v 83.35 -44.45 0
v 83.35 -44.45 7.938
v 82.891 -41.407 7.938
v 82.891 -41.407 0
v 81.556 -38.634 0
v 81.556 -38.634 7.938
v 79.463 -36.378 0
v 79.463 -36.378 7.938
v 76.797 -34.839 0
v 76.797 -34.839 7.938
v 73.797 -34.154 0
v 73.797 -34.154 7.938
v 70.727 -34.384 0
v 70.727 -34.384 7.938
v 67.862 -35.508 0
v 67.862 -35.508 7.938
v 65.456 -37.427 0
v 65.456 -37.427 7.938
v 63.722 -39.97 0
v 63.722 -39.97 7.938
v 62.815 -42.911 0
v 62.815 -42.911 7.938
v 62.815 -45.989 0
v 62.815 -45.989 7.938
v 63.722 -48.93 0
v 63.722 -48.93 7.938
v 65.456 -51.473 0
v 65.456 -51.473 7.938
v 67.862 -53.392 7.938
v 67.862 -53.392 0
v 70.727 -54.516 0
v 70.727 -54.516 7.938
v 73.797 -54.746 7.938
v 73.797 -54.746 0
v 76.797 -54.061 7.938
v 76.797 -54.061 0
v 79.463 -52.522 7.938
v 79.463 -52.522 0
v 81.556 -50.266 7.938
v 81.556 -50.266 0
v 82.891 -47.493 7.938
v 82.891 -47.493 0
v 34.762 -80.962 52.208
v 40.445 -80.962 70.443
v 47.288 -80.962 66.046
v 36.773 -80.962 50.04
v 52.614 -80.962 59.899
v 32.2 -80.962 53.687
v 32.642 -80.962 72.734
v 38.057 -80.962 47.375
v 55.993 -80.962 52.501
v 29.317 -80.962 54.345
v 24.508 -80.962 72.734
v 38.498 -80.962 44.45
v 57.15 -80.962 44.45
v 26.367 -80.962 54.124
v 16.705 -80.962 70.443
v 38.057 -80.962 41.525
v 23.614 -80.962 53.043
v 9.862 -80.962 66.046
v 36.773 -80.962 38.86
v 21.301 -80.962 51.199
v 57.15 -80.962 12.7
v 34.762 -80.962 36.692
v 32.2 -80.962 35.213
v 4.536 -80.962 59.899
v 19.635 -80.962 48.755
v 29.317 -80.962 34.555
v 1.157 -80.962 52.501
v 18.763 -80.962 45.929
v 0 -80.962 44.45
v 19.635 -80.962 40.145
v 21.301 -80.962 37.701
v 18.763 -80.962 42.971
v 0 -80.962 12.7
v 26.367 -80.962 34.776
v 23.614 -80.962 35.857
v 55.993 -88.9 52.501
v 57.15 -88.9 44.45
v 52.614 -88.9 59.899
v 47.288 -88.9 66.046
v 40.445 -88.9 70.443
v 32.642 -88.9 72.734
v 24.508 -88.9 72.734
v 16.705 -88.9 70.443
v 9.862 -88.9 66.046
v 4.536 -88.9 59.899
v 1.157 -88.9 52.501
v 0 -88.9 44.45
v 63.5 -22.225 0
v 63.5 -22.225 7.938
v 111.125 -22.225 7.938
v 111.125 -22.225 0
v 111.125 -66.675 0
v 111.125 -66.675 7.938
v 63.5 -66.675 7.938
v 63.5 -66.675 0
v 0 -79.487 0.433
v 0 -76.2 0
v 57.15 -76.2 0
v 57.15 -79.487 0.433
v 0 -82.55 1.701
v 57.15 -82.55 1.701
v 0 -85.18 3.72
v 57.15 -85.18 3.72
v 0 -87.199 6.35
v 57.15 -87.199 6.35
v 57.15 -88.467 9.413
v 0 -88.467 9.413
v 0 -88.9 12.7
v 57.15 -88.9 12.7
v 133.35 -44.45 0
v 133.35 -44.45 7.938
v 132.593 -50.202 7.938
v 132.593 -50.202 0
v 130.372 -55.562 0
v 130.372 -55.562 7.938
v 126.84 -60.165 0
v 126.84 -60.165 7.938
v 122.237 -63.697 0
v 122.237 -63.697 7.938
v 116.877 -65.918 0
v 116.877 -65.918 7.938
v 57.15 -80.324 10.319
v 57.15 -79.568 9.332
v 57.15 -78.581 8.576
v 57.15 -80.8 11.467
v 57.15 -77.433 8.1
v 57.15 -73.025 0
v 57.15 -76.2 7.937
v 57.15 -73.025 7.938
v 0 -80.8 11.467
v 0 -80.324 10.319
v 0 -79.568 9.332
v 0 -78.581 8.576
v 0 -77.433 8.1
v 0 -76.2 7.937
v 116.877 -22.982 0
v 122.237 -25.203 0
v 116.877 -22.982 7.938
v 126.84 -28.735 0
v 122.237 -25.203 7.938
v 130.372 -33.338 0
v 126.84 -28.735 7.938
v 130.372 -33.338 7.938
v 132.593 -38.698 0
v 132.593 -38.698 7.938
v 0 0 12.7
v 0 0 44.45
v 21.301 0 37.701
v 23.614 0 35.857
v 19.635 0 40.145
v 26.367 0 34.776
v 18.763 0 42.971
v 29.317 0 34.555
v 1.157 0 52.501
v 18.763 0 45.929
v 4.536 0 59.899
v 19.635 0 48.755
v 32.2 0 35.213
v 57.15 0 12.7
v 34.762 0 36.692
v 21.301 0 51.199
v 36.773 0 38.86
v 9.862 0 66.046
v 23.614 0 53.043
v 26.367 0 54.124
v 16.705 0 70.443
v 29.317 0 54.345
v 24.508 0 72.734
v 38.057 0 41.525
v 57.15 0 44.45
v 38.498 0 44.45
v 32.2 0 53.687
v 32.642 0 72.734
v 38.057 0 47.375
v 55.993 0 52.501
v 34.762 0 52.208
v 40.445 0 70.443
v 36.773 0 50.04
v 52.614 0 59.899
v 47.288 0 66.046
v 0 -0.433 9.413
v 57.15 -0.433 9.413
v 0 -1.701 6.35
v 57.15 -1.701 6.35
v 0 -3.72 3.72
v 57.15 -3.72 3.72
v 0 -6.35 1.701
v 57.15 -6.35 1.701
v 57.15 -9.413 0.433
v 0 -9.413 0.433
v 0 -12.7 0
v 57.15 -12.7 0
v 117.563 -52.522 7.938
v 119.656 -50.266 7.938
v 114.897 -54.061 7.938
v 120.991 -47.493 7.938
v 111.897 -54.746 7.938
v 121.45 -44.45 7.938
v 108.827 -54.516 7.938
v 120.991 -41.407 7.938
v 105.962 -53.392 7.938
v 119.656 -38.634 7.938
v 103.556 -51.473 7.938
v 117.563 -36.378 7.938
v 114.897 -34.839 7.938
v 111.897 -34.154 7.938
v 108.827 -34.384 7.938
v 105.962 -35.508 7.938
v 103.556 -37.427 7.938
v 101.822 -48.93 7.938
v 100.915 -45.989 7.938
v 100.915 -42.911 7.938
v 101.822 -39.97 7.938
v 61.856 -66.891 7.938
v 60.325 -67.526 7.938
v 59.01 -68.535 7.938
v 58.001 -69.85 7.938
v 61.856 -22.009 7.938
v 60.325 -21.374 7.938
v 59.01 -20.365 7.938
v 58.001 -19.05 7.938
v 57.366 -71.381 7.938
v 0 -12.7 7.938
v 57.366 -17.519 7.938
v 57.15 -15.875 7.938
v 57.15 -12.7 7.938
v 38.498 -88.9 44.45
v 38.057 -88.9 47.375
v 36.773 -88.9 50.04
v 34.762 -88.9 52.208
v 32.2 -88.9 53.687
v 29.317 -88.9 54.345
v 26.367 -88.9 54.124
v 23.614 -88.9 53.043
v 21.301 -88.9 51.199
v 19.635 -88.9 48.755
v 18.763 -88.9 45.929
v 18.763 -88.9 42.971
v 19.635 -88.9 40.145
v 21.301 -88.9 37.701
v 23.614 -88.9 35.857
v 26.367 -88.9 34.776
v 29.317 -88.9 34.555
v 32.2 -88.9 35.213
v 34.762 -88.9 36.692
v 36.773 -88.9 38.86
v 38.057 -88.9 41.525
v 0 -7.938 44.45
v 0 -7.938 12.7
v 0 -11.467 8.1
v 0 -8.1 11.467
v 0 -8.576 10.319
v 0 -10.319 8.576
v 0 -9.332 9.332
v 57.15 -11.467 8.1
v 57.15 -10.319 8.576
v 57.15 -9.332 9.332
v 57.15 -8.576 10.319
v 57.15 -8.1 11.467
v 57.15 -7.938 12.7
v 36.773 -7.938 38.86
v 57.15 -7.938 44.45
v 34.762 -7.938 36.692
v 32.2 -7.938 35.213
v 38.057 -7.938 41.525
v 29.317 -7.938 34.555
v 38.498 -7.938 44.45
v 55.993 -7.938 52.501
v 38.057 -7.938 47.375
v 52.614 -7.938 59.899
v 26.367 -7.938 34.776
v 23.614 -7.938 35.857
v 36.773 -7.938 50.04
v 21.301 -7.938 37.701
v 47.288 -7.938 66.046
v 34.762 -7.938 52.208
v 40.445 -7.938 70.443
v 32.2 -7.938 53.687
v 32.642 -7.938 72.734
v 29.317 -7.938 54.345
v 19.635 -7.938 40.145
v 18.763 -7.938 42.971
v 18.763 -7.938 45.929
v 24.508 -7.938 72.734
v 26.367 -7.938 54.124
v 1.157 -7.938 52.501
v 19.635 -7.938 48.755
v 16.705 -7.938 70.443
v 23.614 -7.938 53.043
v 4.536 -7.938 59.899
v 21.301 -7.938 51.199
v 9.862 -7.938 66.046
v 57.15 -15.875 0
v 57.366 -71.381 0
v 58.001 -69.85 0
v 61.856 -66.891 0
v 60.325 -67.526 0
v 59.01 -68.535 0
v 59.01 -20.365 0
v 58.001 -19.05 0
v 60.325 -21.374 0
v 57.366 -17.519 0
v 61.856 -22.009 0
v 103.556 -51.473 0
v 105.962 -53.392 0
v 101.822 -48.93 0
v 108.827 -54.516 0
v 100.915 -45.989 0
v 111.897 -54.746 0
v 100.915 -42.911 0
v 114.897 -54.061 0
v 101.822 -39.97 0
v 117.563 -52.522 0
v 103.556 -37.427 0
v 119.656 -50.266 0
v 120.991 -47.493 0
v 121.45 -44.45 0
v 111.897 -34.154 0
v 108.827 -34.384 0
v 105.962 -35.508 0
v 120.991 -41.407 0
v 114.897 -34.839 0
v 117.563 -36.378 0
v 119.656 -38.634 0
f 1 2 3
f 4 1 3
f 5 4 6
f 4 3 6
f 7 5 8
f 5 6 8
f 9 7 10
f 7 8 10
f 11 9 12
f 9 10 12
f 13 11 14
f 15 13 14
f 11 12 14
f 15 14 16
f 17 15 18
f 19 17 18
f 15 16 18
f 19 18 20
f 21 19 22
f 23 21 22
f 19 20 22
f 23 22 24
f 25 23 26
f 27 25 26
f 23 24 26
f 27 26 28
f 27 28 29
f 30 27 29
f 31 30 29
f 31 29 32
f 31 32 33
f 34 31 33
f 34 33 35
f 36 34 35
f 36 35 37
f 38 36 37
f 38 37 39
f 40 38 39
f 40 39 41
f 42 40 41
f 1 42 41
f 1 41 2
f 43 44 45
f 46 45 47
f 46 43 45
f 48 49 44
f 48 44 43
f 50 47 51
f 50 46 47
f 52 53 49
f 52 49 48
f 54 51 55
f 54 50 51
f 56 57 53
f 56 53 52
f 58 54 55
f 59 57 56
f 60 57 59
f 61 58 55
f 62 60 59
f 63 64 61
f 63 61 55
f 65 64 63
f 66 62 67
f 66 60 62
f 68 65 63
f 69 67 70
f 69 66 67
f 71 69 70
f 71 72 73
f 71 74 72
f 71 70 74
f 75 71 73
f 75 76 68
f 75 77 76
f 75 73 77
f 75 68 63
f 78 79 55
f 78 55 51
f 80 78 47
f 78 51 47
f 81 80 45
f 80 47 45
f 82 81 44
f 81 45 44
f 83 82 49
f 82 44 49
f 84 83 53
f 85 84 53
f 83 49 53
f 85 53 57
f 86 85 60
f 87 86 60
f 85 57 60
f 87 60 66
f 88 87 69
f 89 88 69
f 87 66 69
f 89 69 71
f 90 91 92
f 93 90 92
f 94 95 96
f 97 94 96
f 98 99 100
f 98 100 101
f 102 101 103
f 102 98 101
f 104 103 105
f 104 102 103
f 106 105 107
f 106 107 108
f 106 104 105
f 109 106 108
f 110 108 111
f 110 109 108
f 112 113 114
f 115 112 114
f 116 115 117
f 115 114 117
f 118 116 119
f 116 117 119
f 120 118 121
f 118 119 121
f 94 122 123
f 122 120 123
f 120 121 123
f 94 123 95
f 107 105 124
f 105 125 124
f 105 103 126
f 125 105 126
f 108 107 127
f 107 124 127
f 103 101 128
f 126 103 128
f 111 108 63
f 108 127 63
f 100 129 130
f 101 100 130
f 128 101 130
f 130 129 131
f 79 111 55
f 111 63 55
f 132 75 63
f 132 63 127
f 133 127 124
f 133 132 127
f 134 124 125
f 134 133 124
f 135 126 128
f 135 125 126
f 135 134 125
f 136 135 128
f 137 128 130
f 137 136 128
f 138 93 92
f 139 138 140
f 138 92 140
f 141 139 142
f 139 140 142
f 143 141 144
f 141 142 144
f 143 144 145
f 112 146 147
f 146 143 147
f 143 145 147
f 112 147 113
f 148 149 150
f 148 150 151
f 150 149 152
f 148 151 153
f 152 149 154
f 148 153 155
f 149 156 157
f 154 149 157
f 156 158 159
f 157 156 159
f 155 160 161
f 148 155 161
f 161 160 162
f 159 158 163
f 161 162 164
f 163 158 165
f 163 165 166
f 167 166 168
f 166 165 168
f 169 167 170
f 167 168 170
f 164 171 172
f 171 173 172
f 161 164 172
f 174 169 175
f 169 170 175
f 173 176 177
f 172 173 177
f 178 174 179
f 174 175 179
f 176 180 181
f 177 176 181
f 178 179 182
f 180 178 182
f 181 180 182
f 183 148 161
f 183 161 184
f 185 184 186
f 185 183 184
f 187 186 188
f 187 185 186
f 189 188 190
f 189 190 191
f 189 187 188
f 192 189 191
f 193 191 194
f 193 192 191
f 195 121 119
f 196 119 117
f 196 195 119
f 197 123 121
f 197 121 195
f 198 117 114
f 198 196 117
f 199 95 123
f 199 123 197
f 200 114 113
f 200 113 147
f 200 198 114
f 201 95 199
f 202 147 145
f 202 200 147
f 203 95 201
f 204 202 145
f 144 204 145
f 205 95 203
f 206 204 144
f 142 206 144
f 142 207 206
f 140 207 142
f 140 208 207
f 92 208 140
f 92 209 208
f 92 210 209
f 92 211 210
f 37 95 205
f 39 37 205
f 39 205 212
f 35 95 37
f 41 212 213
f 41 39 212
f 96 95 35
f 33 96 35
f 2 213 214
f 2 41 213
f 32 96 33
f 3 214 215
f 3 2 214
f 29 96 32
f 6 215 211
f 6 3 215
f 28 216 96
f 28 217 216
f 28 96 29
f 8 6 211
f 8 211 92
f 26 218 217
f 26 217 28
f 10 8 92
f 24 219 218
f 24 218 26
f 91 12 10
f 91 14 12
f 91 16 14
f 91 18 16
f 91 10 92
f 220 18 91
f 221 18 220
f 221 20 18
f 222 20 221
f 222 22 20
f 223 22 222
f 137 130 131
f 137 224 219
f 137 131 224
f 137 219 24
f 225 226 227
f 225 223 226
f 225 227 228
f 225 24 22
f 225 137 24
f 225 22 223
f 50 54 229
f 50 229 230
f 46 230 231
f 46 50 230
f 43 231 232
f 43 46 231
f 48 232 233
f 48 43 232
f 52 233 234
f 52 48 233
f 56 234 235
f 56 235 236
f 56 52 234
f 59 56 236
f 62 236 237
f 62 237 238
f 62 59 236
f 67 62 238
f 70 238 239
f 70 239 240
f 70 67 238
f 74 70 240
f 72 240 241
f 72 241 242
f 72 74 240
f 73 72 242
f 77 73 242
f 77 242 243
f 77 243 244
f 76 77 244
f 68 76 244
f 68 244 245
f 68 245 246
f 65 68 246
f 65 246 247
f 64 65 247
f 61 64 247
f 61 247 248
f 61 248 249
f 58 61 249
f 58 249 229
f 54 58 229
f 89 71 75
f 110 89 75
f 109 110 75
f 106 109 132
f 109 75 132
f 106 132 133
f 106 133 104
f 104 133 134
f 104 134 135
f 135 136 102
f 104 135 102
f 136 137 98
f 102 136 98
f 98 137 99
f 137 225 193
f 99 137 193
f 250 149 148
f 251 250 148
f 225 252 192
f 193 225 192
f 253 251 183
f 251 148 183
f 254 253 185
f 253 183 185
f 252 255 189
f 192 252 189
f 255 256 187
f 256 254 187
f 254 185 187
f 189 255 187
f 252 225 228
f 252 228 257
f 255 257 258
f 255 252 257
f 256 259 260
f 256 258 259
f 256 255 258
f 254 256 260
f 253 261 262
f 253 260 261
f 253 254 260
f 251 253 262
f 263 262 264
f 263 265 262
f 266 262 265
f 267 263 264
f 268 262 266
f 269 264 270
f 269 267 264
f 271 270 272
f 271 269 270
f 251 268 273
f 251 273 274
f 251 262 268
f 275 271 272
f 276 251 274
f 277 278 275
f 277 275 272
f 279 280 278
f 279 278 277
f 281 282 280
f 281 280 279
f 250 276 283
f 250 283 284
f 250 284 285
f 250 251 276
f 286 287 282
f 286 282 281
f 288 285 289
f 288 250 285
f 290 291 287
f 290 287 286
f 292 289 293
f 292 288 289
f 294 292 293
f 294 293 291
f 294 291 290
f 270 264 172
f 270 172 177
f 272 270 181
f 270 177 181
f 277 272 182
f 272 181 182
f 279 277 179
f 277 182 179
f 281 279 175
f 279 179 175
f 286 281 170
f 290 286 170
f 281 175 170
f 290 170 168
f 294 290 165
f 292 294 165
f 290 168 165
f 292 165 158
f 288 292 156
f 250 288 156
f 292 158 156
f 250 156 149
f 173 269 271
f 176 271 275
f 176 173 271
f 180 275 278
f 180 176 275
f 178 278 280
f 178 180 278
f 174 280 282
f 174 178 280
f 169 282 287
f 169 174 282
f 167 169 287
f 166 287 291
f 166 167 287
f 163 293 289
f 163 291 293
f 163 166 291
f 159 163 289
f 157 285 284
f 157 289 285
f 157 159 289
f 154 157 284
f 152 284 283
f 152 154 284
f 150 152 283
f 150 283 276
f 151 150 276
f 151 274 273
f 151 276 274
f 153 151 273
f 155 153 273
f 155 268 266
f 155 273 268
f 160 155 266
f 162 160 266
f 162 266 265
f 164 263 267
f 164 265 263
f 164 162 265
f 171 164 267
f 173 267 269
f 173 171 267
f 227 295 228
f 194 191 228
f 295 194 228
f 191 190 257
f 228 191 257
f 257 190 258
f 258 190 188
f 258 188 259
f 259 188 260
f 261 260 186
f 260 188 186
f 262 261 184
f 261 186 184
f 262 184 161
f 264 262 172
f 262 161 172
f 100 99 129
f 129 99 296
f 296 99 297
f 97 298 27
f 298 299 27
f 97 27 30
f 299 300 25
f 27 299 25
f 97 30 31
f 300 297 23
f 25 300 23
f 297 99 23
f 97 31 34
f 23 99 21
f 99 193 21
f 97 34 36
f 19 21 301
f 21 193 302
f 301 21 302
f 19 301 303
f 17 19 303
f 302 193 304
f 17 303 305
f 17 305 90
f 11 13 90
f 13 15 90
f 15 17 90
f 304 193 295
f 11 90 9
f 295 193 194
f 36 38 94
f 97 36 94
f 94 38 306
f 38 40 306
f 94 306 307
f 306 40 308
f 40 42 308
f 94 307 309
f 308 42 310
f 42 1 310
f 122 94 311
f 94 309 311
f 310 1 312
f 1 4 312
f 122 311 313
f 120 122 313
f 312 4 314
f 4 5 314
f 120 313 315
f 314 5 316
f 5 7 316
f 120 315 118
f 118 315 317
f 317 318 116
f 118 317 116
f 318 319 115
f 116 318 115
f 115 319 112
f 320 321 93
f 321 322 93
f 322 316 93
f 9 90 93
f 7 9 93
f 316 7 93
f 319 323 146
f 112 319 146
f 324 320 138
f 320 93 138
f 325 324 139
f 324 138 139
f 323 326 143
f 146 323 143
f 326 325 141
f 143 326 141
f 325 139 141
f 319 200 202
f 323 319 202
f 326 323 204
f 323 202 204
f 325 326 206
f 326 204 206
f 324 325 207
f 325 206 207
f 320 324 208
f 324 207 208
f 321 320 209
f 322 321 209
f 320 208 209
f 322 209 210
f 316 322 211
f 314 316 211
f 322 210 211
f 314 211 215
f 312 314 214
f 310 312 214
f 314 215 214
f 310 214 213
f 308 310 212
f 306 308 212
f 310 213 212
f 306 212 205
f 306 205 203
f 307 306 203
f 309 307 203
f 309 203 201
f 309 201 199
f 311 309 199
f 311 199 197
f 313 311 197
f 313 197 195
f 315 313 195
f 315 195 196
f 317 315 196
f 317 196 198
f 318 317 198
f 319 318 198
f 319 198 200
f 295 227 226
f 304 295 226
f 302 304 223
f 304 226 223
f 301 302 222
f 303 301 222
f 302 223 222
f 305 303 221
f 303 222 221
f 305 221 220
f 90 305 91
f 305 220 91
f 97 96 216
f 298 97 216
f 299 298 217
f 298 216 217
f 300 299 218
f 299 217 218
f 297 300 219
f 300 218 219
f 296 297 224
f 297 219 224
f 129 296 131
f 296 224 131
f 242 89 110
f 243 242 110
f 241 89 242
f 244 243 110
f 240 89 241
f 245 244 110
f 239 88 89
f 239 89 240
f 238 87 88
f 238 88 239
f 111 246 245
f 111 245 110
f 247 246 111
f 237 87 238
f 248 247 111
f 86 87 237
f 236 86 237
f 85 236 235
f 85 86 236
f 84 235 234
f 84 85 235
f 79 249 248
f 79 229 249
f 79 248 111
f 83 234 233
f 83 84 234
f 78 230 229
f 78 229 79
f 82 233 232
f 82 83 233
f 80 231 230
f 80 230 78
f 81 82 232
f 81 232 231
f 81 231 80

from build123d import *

# Parameters (mm, degrees)
F0_R     = 9.92251
F0_W     = 76.2
F0_H     = 7.9375
F1_DEPTH = 88.9
F2_R     = 10.3251
F3_DEPTH = 7.9385
F5_DEPTH = 133.351


with BuildPart() as f1:
    # F0 (on Front) → F1 (new body)
    with BuildSketch(Plane.XZ):
        with BuildLine():
            Line((0, 44.45), (0, 0))
            Line((0, 0), (57.15, 0))
            Line((57.15, 0), (57.15, 7.9375))
            Line((57.15, 7.9375), (57.15, 44.45))
            ThreePointArc((57.15, 44.45), (28.575, 73.025), (0, 44.45))
        make_face()
        with Locations((28.575, 44.45)):
            Circle(F0_R, mode=Mode.SUBTRACT)
        with Locations((95.25, 3.96875)):
            Rectangle(F0_W, F0_H)
    extrude(amount=F1_DEPTH)

    # F2 (on face) → F3 (cut, through all)
    with BuildSketch(Plane.XY.offset(7.9375)):
        with Locations((73.025, -44.45)):
            Circle(F2_R)
        with Locations((111.125, -44.45)):
            Circle(F2_R)
        with BuildLine():
            Line((133.35, 0), (57.15, 0))
            Line((57.15, 0), (57.15, -15.875))
            ThreePointArc((57.15, -15.875), (59.009872, -20.365128), (63.5, -22.225))
            Line((63.5, -22.225), (111.125, -22.225))
            ThreePointArc((111.125, -22.225), (126.840448, -28.734552), (133.35, -44.45))
            Line((133.35, -44.45), (133.35, 0))
        make_face()
        with BuildLine():
            Line((133.35, -88.9), (133.35, -44.45))
            ThreePointArc((133.35, -44.45), (126.840448, -60.165448), (111.125, -66.675))
            Line((111.125, -66.675), (63.5, -66.675))
            ThreePointArc((63.5, -66.675), (59.009872, -68.534872), (57.15, -73.025))
            Line((57.15, -73.025), (57.15, -88.9))
            Line((57.15, -88.9), (133.35, -88.9))
        make_face()
    extrude(amount=-F3_DEPTH, mode=Mode.SUBTRACT)

    # F4 (on Right) → F5 (cut, through all)
    with BuildSketch(Plane.YZ):
        with BuildLine():
            Line((-7.9375, 73.025), (-80.9625, 73.025))
            Line((-80.9625, 73.025), (-80.9625, 12.7))
            ThreePointArc((-80.9625, 12.7), (-79.567596, 9.332404), (-76.2, 7.9375))
            Line((-76.2, 7.9375), (-12.7, 7.9375))
            ThreePointArc((-12.7, 7.9375), (-9.332404, 9.332404), (-7.9375, 12.7))
            Line((-7.9375, 12.7), (-7.9375, 73.025))
        make_face()
        with BuildLine():
            ThreePointArc((-76.2, 0), (-85.180256, 3.719744), (-88.9, 12.7))
            Line((-88.9, 12.7), (-88.9, 0))
            Line((-88.9, 0), (-76.2, 0))
        make_face()
        with BuildLine():
            Line((-12.7, 0), (0, 0))
            Line((0, 0), (0, 12.7))
            ThreePointArc((0, 12.7), (-3.719744, 3.719744), (-12.7, 0))
        make_face()
    extrude(amount=F5_DEPTH, mode=Mode.SUBTRACT)


solid = f1.part
